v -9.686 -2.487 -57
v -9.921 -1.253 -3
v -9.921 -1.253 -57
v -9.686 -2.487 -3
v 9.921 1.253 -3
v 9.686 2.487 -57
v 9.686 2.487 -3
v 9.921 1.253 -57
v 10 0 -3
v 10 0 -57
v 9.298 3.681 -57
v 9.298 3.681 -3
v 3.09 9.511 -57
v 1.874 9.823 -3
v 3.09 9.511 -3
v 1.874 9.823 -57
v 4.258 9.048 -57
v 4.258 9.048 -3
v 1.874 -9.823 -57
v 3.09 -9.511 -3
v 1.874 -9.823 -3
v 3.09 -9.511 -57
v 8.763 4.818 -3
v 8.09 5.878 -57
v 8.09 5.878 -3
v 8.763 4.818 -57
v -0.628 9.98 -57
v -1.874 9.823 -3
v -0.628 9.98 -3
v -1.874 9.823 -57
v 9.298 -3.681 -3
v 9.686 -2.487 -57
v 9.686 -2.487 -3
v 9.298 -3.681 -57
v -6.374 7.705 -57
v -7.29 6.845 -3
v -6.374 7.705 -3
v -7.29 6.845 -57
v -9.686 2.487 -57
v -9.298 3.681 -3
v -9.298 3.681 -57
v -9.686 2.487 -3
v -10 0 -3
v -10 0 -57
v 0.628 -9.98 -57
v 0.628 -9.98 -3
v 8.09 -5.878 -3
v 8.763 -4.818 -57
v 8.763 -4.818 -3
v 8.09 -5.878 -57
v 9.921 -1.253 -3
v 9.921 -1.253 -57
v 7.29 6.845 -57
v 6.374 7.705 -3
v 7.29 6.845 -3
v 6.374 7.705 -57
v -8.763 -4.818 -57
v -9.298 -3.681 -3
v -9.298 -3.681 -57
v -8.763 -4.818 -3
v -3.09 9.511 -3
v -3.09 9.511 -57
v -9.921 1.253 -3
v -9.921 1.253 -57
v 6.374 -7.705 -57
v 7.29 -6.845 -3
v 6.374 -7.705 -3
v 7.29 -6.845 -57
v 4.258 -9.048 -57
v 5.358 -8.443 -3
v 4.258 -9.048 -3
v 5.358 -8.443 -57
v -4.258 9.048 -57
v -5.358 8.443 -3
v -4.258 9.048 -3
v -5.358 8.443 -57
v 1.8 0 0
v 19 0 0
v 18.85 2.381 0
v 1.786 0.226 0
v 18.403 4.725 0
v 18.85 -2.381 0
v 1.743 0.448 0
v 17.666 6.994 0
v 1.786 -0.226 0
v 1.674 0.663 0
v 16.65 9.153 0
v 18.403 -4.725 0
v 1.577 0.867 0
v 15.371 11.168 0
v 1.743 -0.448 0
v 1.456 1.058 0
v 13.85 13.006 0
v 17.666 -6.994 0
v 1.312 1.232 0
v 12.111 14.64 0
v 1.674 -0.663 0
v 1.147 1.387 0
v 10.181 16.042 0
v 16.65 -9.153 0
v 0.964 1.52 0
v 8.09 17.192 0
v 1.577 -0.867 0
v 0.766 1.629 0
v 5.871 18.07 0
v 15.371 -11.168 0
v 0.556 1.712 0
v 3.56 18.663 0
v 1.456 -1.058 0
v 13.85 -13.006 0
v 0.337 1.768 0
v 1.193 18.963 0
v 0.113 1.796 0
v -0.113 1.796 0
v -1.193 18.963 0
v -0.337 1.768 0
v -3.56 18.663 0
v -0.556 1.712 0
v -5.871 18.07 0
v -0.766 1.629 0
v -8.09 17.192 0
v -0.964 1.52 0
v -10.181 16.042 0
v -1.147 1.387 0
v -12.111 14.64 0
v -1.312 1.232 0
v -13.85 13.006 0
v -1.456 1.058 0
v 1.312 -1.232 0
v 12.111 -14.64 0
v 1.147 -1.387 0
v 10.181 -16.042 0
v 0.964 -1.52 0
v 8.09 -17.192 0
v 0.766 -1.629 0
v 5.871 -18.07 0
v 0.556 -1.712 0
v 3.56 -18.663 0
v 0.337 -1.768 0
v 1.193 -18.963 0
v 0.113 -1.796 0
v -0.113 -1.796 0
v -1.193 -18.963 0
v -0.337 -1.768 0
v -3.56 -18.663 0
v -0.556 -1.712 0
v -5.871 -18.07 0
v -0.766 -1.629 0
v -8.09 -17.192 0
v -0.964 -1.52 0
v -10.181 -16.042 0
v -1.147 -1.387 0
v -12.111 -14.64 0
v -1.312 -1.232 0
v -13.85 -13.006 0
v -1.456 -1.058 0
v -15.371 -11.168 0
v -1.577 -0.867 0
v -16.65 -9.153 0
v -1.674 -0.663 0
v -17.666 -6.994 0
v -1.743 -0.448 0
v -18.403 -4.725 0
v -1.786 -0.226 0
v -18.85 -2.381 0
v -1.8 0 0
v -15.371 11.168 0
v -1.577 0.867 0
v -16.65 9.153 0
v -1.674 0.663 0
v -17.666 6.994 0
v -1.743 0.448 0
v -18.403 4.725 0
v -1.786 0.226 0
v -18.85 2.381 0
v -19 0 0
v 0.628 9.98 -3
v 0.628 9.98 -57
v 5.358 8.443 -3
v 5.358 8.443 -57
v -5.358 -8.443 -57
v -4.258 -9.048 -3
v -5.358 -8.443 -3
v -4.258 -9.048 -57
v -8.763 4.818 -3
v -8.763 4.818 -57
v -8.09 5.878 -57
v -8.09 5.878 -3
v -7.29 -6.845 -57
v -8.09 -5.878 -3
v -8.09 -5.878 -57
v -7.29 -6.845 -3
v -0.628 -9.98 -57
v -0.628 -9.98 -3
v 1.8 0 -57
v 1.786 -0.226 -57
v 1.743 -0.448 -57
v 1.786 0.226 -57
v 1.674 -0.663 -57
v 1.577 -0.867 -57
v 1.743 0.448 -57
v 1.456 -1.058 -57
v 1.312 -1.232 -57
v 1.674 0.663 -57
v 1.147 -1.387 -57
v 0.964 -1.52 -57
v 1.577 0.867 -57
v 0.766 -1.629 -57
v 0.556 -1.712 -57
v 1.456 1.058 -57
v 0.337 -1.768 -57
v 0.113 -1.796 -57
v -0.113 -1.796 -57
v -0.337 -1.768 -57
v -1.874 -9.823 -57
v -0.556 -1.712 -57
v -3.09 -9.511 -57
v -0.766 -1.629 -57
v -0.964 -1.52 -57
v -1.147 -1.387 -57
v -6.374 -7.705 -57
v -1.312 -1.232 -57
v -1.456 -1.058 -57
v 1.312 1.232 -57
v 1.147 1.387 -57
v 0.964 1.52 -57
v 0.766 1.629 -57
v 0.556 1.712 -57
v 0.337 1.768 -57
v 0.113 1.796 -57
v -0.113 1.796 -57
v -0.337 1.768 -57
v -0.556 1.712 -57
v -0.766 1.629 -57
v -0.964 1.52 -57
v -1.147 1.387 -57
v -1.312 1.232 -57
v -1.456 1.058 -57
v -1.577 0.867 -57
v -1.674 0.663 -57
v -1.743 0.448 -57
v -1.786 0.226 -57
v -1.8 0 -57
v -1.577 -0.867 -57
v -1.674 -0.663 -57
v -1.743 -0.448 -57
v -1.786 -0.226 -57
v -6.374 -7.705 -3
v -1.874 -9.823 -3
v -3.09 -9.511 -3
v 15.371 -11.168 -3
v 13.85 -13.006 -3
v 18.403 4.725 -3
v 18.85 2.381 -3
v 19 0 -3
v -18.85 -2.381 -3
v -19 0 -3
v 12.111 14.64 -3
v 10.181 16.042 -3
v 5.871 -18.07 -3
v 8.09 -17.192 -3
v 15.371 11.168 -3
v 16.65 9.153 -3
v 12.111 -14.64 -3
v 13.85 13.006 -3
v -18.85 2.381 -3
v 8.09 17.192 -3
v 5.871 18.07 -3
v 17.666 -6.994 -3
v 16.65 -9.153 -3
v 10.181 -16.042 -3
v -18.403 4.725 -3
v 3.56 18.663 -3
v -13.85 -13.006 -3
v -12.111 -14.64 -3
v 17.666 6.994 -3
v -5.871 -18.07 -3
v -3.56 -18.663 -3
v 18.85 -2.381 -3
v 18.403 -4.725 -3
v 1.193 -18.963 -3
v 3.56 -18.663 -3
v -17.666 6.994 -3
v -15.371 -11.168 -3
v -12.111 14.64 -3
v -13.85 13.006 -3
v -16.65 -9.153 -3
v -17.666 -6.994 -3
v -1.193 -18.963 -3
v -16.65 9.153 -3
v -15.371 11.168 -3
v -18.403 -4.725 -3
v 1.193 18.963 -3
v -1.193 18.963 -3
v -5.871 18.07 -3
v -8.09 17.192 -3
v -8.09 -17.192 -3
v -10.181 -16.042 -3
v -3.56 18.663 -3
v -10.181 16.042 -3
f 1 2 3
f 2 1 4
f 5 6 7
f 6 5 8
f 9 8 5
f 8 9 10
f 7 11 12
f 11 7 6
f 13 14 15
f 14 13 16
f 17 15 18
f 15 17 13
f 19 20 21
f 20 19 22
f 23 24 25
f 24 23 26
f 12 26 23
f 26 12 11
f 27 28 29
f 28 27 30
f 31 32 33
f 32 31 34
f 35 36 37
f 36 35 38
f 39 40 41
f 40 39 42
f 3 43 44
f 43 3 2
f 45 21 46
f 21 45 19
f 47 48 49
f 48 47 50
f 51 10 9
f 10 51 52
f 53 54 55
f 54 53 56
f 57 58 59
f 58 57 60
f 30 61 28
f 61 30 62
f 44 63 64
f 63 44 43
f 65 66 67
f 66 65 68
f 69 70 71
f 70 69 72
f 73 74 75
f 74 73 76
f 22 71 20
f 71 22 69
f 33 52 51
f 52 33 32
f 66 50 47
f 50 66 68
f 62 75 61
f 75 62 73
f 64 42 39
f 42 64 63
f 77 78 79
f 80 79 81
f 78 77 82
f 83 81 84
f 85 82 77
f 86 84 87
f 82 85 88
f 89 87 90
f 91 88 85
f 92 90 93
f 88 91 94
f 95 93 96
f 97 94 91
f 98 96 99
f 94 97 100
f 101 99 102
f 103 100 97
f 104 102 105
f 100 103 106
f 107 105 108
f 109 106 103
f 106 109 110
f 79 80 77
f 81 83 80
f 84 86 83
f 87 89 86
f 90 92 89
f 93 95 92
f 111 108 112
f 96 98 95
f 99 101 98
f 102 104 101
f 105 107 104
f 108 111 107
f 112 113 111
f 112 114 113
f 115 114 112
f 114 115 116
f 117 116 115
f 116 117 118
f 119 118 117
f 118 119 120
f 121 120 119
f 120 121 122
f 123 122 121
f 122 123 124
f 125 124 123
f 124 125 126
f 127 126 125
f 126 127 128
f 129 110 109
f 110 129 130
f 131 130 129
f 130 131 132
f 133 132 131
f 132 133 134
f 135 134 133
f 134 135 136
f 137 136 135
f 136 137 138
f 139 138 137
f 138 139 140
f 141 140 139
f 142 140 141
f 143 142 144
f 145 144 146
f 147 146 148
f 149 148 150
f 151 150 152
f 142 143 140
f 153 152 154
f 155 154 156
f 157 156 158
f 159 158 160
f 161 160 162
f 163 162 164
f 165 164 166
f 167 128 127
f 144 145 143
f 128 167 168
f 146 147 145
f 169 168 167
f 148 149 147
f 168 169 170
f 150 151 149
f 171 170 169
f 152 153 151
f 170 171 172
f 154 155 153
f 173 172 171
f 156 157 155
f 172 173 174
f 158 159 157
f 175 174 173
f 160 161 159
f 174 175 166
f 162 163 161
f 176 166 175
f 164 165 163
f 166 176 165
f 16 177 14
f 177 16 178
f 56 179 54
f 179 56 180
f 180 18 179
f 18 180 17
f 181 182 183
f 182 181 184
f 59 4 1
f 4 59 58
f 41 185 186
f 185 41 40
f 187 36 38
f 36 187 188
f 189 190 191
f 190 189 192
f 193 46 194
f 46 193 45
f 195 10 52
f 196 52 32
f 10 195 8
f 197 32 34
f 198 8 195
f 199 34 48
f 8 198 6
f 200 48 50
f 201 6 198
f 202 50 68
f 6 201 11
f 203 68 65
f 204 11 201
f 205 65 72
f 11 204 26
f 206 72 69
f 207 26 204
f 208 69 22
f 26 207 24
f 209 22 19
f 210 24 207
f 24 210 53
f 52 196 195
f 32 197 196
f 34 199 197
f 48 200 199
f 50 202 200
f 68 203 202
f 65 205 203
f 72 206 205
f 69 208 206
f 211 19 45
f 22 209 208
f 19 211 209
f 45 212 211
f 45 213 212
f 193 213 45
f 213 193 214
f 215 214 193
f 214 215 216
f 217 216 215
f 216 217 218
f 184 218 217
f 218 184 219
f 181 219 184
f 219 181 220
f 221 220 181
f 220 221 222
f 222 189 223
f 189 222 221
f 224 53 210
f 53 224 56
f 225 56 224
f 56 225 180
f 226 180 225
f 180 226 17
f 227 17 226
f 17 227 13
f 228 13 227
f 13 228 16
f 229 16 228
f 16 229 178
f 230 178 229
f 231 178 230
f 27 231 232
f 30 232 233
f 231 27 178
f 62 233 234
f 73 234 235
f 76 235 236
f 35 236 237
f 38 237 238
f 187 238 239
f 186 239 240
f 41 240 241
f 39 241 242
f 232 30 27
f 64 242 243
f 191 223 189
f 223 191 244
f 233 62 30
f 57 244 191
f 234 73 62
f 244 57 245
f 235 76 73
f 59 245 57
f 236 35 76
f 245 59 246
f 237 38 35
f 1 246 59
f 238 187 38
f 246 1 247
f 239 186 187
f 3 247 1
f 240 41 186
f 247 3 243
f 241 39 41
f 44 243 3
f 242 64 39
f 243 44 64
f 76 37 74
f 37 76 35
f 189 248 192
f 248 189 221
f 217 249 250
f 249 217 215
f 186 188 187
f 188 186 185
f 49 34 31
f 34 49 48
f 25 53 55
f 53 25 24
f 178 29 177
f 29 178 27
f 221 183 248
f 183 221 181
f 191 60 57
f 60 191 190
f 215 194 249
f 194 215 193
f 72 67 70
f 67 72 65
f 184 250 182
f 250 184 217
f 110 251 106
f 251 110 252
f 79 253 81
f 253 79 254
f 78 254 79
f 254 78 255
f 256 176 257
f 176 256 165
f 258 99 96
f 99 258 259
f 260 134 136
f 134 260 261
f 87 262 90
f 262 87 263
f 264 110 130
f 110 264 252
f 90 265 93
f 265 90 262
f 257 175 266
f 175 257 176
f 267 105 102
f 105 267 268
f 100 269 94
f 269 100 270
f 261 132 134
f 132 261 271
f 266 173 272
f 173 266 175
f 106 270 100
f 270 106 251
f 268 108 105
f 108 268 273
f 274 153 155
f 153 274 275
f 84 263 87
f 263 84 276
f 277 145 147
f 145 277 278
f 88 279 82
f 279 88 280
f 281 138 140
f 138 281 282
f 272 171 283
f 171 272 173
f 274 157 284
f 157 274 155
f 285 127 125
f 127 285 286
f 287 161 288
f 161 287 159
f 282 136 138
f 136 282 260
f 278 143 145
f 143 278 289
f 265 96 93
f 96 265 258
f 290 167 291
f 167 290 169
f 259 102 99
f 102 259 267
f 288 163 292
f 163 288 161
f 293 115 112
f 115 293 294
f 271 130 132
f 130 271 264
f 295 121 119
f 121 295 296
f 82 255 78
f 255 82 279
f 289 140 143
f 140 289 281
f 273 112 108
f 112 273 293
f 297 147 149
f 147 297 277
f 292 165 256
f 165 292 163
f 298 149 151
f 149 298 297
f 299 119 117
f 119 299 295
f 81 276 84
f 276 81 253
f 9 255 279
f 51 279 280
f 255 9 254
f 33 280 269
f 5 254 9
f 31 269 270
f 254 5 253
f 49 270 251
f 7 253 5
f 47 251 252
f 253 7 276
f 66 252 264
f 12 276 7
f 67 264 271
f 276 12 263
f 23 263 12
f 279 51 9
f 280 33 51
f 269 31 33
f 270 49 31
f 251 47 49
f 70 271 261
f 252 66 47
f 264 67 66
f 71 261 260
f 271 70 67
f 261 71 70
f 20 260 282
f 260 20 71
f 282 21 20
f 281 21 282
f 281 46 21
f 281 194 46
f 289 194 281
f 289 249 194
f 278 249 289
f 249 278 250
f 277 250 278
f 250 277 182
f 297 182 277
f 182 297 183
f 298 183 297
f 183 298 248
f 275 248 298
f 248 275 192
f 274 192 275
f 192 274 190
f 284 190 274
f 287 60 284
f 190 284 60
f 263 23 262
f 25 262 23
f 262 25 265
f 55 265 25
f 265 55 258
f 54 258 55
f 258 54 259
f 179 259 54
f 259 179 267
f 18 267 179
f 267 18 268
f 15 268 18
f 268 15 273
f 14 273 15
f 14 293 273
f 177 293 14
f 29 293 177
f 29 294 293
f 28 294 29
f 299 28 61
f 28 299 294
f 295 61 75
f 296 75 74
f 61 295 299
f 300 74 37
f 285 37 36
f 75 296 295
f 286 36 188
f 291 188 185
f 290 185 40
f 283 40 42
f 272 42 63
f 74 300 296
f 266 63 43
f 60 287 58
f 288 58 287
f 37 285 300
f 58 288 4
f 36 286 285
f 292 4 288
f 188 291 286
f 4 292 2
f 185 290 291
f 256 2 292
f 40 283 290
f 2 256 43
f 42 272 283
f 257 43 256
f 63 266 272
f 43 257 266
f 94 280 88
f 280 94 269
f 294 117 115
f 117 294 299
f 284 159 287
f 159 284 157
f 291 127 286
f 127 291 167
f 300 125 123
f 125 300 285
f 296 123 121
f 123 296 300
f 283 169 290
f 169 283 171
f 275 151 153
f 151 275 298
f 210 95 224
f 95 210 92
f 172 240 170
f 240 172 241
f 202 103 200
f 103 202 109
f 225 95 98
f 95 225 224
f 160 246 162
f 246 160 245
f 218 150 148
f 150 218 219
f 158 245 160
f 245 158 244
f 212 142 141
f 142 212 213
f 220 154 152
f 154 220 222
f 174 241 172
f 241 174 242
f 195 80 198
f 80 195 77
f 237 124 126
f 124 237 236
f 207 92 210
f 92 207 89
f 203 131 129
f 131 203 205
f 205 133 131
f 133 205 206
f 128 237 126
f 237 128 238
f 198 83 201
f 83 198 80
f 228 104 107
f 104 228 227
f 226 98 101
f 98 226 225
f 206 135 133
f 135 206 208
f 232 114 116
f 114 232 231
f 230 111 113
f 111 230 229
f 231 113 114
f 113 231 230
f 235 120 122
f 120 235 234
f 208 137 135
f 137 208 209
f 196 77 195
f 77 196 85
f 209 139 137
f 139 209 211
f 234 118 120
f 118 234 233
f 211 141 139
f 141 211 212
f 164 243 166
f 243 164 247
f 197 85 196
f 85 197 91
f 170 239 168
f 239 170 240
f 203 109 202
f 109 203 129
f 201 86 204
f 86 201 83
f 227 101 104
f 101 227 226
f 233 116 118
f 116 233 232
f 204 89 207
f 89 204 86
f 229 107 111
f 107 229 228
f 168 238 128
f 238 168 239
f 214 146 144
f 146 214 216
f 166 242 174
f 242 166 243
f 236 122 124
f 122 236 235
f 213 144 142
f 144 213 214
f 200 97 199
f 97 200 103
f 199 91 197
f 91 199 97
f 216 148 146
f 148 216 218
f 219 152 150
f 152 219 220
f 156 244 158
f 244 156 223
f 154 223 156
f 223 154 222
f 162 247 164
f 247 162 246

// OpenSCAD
$fn = 50;


difference() {
	union() {
		translate(v = [0, 0, -57.0000000000]) {
			cylinder(h = 57, r = 10.0000000000);
		}
		translate(v = [0, 0, -3.0000000000]) {
			cylinder(h = 3, r = 19.0000000000);
		}
	}
	union() {
		#translate(v = [0, 0, -57]) {
			cylinder(h = 57, r = 1.8000000000);
		}
	}
}
